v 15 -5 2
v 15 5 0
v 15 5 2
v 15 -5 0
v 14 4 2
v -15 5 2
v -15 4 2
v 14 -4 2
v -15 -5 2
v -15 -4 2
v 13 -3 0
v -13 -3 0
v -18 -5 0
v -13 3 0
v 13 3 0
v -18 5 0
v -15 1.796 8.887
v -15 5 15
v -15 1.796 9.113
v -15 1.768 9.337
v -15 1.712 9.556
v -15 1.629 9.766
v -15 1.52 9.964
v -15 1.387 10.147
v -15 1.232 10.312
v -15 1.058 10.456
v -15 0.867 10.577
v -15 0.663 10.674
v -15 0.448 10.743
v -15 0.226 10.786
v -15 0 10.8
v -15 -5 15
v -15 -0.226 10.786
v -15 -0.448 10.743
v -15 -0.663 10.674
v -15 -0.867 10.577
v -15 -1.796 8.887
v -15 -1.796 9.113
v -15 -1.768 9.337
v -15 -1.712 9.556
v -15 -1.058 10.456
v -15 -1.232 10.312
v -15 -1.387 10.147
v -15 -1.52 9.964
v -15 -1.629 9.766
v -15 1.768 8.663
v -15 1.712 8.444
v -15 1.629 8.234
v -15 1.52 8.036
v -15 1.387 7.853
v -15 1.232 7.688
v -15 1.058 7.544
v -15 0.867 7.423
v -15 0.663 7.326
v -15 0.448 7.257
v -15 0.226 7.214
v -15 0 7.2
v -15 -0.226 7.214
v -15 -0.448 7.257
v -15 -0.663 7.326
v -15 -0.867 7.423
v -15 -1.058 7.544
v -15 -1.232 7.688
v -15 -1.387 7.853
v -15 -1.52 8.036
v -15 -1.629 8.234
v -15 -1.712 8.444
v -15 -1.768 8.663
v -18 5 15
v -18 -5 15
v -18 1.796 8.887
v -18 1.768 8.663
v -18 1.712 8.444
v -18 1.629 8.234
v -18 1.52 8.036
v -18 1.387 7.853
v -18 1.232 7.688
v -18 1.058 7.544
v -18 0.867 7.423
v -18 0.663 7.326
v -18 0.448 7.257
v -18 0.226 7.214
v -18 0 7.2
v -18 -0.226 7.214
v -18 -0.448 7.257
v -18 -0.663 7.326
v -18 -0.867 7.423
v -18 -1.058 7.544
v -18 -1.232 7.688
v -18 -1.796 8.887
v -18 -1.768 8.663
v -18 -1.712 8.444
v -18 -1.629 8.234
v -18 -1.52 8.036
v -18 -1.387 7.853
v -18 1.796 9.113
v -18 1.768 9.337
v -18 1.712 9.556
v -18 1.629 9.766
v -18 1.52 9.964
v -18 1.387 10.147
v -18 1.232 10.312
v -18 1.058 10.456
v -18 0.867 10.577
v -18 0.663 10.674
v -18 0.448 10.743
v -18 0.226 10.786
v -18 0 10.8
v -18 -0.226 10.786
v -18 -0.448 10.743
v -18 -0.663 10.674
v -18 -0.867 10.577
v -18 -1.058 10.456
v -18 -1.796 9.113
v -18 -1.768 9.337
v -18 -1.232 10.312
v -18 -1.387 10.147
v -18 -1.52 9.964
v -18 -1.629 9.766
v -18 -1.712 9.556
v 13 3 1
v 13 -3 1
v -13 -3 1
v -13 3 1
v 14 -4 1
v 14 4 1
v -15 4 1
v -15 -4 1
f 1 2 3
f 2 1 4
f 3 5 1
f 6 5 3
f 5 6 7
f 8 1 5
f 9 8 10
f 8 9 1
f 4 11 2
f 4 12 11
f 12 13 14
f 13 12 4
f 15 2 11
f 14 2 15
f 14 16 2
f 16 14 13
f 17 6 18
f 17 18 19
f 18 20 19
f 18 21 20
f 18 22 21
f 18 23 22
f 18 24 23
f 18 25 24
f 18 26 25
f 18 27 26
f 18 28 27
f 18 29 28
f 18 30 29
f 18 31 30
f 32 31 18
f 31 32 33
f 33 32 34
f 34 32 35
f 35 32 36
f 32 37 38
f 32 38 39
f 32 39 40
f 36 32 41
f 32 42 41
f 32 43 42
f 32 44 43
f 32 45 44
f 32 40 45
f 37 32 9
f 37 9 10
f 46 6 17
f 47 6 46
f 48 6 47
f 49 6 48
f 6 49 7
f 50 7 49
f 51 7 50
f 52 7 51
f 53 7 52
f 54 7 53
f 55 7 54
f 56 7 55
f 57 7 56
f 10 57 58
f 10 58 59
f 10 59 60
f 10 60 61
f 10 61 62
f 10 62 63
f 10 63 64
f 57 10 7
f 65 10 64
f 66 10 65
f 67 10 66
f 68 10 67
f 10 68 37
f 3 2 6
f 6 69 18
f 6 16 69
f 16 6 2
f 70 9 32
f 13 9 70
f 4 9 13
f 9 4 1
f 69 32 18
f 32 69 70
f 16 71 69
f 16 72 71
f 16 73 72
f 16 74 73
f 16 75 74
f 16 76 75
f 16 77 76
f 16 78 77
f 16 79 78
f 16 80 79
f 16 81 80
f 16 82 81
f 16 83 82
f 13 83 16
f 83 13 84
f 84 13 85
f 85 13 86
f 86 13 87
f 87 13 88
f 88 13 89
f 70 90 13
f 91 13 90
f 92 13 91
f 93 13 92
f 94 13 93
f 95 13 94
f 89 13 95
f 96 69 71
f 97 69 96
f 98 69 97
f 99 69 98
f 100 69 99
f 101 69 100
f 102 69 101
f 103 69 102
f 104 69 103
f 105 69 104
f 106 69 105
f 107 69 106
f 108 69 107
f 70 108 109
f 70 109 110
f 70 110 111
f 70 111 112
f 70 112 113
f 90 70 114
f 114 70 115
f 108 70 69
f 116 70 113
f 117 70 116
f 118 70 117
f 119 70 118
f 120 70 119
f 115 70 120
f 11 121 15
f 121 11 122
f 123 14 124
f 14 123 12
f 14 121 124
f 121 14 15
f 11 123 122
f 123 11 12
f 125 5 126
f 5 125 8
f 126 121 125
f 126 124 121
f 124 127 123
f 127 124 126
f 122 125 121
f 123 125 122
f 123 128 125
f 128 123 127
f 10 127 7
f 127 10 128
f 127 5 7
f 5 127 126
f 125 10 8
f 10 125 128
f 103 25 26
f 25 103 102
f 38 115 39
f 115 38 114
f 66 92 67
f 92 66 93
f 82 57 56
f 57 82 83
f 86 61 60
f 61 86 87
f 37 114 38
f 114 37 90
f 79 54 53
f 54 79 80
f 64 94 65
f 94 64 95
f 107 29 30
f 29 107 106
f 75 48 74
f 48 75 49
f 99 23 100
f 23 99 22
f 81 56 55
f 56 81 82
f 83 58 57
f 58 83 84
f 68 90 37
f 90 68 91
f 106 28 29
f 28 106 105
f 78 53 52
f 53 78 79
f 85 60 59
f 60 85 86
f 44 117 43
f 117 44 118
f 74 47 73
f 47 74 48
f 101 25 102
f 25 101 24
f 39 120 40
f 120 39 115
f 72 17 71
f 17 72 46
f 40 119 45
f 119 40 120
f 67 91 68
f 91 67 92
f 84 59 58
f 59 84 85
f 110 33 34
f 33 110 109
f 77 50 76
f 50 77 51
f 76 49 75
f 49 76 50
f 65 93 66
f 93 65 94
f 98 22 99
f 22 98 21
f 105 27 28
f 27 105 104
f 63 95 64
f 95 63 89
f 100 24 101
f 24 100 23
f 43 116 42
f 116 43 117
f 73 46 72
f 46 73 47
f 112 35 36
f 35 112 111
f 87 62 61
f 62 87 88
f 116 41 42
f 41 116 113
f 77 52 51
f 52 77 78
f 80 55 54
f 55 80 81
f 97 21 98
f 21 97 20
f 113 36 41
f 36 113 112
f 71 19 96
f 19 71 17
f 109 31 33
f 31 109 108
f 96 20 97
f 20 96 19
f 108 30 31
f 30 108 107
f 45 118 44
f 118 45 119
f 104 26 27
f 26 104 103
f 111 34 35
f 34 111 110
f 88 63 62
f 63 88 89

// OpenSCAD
$fn = 50;


difference() {
	union() {
		translate(v = [-15.0000000000, -5.0000000000, 0]) {
			cube(size = [30, 10, 2]);
		}
		translate(v = [-18.0000000000, -5.0000000000, 0]) {
			cube(size = [3, 10, 15]);
		}
	}
	union() {
		translate(v = [-13.0000000000, -3.0000000000, 0]) {
			cube(size = [26, 6, 2]);
		}
		translate(v = [-15.0000000000, -4.0000000000, 1]) {
			cube(size = [29, 8, 1]);
		}
		#translate(v = [-25.0000000000, 0, 9]) {
			rotate(a = [0, 90, 0]) {
				cylinder(h = 20, r = 1.8000000000);
			}
		}
	}
}
